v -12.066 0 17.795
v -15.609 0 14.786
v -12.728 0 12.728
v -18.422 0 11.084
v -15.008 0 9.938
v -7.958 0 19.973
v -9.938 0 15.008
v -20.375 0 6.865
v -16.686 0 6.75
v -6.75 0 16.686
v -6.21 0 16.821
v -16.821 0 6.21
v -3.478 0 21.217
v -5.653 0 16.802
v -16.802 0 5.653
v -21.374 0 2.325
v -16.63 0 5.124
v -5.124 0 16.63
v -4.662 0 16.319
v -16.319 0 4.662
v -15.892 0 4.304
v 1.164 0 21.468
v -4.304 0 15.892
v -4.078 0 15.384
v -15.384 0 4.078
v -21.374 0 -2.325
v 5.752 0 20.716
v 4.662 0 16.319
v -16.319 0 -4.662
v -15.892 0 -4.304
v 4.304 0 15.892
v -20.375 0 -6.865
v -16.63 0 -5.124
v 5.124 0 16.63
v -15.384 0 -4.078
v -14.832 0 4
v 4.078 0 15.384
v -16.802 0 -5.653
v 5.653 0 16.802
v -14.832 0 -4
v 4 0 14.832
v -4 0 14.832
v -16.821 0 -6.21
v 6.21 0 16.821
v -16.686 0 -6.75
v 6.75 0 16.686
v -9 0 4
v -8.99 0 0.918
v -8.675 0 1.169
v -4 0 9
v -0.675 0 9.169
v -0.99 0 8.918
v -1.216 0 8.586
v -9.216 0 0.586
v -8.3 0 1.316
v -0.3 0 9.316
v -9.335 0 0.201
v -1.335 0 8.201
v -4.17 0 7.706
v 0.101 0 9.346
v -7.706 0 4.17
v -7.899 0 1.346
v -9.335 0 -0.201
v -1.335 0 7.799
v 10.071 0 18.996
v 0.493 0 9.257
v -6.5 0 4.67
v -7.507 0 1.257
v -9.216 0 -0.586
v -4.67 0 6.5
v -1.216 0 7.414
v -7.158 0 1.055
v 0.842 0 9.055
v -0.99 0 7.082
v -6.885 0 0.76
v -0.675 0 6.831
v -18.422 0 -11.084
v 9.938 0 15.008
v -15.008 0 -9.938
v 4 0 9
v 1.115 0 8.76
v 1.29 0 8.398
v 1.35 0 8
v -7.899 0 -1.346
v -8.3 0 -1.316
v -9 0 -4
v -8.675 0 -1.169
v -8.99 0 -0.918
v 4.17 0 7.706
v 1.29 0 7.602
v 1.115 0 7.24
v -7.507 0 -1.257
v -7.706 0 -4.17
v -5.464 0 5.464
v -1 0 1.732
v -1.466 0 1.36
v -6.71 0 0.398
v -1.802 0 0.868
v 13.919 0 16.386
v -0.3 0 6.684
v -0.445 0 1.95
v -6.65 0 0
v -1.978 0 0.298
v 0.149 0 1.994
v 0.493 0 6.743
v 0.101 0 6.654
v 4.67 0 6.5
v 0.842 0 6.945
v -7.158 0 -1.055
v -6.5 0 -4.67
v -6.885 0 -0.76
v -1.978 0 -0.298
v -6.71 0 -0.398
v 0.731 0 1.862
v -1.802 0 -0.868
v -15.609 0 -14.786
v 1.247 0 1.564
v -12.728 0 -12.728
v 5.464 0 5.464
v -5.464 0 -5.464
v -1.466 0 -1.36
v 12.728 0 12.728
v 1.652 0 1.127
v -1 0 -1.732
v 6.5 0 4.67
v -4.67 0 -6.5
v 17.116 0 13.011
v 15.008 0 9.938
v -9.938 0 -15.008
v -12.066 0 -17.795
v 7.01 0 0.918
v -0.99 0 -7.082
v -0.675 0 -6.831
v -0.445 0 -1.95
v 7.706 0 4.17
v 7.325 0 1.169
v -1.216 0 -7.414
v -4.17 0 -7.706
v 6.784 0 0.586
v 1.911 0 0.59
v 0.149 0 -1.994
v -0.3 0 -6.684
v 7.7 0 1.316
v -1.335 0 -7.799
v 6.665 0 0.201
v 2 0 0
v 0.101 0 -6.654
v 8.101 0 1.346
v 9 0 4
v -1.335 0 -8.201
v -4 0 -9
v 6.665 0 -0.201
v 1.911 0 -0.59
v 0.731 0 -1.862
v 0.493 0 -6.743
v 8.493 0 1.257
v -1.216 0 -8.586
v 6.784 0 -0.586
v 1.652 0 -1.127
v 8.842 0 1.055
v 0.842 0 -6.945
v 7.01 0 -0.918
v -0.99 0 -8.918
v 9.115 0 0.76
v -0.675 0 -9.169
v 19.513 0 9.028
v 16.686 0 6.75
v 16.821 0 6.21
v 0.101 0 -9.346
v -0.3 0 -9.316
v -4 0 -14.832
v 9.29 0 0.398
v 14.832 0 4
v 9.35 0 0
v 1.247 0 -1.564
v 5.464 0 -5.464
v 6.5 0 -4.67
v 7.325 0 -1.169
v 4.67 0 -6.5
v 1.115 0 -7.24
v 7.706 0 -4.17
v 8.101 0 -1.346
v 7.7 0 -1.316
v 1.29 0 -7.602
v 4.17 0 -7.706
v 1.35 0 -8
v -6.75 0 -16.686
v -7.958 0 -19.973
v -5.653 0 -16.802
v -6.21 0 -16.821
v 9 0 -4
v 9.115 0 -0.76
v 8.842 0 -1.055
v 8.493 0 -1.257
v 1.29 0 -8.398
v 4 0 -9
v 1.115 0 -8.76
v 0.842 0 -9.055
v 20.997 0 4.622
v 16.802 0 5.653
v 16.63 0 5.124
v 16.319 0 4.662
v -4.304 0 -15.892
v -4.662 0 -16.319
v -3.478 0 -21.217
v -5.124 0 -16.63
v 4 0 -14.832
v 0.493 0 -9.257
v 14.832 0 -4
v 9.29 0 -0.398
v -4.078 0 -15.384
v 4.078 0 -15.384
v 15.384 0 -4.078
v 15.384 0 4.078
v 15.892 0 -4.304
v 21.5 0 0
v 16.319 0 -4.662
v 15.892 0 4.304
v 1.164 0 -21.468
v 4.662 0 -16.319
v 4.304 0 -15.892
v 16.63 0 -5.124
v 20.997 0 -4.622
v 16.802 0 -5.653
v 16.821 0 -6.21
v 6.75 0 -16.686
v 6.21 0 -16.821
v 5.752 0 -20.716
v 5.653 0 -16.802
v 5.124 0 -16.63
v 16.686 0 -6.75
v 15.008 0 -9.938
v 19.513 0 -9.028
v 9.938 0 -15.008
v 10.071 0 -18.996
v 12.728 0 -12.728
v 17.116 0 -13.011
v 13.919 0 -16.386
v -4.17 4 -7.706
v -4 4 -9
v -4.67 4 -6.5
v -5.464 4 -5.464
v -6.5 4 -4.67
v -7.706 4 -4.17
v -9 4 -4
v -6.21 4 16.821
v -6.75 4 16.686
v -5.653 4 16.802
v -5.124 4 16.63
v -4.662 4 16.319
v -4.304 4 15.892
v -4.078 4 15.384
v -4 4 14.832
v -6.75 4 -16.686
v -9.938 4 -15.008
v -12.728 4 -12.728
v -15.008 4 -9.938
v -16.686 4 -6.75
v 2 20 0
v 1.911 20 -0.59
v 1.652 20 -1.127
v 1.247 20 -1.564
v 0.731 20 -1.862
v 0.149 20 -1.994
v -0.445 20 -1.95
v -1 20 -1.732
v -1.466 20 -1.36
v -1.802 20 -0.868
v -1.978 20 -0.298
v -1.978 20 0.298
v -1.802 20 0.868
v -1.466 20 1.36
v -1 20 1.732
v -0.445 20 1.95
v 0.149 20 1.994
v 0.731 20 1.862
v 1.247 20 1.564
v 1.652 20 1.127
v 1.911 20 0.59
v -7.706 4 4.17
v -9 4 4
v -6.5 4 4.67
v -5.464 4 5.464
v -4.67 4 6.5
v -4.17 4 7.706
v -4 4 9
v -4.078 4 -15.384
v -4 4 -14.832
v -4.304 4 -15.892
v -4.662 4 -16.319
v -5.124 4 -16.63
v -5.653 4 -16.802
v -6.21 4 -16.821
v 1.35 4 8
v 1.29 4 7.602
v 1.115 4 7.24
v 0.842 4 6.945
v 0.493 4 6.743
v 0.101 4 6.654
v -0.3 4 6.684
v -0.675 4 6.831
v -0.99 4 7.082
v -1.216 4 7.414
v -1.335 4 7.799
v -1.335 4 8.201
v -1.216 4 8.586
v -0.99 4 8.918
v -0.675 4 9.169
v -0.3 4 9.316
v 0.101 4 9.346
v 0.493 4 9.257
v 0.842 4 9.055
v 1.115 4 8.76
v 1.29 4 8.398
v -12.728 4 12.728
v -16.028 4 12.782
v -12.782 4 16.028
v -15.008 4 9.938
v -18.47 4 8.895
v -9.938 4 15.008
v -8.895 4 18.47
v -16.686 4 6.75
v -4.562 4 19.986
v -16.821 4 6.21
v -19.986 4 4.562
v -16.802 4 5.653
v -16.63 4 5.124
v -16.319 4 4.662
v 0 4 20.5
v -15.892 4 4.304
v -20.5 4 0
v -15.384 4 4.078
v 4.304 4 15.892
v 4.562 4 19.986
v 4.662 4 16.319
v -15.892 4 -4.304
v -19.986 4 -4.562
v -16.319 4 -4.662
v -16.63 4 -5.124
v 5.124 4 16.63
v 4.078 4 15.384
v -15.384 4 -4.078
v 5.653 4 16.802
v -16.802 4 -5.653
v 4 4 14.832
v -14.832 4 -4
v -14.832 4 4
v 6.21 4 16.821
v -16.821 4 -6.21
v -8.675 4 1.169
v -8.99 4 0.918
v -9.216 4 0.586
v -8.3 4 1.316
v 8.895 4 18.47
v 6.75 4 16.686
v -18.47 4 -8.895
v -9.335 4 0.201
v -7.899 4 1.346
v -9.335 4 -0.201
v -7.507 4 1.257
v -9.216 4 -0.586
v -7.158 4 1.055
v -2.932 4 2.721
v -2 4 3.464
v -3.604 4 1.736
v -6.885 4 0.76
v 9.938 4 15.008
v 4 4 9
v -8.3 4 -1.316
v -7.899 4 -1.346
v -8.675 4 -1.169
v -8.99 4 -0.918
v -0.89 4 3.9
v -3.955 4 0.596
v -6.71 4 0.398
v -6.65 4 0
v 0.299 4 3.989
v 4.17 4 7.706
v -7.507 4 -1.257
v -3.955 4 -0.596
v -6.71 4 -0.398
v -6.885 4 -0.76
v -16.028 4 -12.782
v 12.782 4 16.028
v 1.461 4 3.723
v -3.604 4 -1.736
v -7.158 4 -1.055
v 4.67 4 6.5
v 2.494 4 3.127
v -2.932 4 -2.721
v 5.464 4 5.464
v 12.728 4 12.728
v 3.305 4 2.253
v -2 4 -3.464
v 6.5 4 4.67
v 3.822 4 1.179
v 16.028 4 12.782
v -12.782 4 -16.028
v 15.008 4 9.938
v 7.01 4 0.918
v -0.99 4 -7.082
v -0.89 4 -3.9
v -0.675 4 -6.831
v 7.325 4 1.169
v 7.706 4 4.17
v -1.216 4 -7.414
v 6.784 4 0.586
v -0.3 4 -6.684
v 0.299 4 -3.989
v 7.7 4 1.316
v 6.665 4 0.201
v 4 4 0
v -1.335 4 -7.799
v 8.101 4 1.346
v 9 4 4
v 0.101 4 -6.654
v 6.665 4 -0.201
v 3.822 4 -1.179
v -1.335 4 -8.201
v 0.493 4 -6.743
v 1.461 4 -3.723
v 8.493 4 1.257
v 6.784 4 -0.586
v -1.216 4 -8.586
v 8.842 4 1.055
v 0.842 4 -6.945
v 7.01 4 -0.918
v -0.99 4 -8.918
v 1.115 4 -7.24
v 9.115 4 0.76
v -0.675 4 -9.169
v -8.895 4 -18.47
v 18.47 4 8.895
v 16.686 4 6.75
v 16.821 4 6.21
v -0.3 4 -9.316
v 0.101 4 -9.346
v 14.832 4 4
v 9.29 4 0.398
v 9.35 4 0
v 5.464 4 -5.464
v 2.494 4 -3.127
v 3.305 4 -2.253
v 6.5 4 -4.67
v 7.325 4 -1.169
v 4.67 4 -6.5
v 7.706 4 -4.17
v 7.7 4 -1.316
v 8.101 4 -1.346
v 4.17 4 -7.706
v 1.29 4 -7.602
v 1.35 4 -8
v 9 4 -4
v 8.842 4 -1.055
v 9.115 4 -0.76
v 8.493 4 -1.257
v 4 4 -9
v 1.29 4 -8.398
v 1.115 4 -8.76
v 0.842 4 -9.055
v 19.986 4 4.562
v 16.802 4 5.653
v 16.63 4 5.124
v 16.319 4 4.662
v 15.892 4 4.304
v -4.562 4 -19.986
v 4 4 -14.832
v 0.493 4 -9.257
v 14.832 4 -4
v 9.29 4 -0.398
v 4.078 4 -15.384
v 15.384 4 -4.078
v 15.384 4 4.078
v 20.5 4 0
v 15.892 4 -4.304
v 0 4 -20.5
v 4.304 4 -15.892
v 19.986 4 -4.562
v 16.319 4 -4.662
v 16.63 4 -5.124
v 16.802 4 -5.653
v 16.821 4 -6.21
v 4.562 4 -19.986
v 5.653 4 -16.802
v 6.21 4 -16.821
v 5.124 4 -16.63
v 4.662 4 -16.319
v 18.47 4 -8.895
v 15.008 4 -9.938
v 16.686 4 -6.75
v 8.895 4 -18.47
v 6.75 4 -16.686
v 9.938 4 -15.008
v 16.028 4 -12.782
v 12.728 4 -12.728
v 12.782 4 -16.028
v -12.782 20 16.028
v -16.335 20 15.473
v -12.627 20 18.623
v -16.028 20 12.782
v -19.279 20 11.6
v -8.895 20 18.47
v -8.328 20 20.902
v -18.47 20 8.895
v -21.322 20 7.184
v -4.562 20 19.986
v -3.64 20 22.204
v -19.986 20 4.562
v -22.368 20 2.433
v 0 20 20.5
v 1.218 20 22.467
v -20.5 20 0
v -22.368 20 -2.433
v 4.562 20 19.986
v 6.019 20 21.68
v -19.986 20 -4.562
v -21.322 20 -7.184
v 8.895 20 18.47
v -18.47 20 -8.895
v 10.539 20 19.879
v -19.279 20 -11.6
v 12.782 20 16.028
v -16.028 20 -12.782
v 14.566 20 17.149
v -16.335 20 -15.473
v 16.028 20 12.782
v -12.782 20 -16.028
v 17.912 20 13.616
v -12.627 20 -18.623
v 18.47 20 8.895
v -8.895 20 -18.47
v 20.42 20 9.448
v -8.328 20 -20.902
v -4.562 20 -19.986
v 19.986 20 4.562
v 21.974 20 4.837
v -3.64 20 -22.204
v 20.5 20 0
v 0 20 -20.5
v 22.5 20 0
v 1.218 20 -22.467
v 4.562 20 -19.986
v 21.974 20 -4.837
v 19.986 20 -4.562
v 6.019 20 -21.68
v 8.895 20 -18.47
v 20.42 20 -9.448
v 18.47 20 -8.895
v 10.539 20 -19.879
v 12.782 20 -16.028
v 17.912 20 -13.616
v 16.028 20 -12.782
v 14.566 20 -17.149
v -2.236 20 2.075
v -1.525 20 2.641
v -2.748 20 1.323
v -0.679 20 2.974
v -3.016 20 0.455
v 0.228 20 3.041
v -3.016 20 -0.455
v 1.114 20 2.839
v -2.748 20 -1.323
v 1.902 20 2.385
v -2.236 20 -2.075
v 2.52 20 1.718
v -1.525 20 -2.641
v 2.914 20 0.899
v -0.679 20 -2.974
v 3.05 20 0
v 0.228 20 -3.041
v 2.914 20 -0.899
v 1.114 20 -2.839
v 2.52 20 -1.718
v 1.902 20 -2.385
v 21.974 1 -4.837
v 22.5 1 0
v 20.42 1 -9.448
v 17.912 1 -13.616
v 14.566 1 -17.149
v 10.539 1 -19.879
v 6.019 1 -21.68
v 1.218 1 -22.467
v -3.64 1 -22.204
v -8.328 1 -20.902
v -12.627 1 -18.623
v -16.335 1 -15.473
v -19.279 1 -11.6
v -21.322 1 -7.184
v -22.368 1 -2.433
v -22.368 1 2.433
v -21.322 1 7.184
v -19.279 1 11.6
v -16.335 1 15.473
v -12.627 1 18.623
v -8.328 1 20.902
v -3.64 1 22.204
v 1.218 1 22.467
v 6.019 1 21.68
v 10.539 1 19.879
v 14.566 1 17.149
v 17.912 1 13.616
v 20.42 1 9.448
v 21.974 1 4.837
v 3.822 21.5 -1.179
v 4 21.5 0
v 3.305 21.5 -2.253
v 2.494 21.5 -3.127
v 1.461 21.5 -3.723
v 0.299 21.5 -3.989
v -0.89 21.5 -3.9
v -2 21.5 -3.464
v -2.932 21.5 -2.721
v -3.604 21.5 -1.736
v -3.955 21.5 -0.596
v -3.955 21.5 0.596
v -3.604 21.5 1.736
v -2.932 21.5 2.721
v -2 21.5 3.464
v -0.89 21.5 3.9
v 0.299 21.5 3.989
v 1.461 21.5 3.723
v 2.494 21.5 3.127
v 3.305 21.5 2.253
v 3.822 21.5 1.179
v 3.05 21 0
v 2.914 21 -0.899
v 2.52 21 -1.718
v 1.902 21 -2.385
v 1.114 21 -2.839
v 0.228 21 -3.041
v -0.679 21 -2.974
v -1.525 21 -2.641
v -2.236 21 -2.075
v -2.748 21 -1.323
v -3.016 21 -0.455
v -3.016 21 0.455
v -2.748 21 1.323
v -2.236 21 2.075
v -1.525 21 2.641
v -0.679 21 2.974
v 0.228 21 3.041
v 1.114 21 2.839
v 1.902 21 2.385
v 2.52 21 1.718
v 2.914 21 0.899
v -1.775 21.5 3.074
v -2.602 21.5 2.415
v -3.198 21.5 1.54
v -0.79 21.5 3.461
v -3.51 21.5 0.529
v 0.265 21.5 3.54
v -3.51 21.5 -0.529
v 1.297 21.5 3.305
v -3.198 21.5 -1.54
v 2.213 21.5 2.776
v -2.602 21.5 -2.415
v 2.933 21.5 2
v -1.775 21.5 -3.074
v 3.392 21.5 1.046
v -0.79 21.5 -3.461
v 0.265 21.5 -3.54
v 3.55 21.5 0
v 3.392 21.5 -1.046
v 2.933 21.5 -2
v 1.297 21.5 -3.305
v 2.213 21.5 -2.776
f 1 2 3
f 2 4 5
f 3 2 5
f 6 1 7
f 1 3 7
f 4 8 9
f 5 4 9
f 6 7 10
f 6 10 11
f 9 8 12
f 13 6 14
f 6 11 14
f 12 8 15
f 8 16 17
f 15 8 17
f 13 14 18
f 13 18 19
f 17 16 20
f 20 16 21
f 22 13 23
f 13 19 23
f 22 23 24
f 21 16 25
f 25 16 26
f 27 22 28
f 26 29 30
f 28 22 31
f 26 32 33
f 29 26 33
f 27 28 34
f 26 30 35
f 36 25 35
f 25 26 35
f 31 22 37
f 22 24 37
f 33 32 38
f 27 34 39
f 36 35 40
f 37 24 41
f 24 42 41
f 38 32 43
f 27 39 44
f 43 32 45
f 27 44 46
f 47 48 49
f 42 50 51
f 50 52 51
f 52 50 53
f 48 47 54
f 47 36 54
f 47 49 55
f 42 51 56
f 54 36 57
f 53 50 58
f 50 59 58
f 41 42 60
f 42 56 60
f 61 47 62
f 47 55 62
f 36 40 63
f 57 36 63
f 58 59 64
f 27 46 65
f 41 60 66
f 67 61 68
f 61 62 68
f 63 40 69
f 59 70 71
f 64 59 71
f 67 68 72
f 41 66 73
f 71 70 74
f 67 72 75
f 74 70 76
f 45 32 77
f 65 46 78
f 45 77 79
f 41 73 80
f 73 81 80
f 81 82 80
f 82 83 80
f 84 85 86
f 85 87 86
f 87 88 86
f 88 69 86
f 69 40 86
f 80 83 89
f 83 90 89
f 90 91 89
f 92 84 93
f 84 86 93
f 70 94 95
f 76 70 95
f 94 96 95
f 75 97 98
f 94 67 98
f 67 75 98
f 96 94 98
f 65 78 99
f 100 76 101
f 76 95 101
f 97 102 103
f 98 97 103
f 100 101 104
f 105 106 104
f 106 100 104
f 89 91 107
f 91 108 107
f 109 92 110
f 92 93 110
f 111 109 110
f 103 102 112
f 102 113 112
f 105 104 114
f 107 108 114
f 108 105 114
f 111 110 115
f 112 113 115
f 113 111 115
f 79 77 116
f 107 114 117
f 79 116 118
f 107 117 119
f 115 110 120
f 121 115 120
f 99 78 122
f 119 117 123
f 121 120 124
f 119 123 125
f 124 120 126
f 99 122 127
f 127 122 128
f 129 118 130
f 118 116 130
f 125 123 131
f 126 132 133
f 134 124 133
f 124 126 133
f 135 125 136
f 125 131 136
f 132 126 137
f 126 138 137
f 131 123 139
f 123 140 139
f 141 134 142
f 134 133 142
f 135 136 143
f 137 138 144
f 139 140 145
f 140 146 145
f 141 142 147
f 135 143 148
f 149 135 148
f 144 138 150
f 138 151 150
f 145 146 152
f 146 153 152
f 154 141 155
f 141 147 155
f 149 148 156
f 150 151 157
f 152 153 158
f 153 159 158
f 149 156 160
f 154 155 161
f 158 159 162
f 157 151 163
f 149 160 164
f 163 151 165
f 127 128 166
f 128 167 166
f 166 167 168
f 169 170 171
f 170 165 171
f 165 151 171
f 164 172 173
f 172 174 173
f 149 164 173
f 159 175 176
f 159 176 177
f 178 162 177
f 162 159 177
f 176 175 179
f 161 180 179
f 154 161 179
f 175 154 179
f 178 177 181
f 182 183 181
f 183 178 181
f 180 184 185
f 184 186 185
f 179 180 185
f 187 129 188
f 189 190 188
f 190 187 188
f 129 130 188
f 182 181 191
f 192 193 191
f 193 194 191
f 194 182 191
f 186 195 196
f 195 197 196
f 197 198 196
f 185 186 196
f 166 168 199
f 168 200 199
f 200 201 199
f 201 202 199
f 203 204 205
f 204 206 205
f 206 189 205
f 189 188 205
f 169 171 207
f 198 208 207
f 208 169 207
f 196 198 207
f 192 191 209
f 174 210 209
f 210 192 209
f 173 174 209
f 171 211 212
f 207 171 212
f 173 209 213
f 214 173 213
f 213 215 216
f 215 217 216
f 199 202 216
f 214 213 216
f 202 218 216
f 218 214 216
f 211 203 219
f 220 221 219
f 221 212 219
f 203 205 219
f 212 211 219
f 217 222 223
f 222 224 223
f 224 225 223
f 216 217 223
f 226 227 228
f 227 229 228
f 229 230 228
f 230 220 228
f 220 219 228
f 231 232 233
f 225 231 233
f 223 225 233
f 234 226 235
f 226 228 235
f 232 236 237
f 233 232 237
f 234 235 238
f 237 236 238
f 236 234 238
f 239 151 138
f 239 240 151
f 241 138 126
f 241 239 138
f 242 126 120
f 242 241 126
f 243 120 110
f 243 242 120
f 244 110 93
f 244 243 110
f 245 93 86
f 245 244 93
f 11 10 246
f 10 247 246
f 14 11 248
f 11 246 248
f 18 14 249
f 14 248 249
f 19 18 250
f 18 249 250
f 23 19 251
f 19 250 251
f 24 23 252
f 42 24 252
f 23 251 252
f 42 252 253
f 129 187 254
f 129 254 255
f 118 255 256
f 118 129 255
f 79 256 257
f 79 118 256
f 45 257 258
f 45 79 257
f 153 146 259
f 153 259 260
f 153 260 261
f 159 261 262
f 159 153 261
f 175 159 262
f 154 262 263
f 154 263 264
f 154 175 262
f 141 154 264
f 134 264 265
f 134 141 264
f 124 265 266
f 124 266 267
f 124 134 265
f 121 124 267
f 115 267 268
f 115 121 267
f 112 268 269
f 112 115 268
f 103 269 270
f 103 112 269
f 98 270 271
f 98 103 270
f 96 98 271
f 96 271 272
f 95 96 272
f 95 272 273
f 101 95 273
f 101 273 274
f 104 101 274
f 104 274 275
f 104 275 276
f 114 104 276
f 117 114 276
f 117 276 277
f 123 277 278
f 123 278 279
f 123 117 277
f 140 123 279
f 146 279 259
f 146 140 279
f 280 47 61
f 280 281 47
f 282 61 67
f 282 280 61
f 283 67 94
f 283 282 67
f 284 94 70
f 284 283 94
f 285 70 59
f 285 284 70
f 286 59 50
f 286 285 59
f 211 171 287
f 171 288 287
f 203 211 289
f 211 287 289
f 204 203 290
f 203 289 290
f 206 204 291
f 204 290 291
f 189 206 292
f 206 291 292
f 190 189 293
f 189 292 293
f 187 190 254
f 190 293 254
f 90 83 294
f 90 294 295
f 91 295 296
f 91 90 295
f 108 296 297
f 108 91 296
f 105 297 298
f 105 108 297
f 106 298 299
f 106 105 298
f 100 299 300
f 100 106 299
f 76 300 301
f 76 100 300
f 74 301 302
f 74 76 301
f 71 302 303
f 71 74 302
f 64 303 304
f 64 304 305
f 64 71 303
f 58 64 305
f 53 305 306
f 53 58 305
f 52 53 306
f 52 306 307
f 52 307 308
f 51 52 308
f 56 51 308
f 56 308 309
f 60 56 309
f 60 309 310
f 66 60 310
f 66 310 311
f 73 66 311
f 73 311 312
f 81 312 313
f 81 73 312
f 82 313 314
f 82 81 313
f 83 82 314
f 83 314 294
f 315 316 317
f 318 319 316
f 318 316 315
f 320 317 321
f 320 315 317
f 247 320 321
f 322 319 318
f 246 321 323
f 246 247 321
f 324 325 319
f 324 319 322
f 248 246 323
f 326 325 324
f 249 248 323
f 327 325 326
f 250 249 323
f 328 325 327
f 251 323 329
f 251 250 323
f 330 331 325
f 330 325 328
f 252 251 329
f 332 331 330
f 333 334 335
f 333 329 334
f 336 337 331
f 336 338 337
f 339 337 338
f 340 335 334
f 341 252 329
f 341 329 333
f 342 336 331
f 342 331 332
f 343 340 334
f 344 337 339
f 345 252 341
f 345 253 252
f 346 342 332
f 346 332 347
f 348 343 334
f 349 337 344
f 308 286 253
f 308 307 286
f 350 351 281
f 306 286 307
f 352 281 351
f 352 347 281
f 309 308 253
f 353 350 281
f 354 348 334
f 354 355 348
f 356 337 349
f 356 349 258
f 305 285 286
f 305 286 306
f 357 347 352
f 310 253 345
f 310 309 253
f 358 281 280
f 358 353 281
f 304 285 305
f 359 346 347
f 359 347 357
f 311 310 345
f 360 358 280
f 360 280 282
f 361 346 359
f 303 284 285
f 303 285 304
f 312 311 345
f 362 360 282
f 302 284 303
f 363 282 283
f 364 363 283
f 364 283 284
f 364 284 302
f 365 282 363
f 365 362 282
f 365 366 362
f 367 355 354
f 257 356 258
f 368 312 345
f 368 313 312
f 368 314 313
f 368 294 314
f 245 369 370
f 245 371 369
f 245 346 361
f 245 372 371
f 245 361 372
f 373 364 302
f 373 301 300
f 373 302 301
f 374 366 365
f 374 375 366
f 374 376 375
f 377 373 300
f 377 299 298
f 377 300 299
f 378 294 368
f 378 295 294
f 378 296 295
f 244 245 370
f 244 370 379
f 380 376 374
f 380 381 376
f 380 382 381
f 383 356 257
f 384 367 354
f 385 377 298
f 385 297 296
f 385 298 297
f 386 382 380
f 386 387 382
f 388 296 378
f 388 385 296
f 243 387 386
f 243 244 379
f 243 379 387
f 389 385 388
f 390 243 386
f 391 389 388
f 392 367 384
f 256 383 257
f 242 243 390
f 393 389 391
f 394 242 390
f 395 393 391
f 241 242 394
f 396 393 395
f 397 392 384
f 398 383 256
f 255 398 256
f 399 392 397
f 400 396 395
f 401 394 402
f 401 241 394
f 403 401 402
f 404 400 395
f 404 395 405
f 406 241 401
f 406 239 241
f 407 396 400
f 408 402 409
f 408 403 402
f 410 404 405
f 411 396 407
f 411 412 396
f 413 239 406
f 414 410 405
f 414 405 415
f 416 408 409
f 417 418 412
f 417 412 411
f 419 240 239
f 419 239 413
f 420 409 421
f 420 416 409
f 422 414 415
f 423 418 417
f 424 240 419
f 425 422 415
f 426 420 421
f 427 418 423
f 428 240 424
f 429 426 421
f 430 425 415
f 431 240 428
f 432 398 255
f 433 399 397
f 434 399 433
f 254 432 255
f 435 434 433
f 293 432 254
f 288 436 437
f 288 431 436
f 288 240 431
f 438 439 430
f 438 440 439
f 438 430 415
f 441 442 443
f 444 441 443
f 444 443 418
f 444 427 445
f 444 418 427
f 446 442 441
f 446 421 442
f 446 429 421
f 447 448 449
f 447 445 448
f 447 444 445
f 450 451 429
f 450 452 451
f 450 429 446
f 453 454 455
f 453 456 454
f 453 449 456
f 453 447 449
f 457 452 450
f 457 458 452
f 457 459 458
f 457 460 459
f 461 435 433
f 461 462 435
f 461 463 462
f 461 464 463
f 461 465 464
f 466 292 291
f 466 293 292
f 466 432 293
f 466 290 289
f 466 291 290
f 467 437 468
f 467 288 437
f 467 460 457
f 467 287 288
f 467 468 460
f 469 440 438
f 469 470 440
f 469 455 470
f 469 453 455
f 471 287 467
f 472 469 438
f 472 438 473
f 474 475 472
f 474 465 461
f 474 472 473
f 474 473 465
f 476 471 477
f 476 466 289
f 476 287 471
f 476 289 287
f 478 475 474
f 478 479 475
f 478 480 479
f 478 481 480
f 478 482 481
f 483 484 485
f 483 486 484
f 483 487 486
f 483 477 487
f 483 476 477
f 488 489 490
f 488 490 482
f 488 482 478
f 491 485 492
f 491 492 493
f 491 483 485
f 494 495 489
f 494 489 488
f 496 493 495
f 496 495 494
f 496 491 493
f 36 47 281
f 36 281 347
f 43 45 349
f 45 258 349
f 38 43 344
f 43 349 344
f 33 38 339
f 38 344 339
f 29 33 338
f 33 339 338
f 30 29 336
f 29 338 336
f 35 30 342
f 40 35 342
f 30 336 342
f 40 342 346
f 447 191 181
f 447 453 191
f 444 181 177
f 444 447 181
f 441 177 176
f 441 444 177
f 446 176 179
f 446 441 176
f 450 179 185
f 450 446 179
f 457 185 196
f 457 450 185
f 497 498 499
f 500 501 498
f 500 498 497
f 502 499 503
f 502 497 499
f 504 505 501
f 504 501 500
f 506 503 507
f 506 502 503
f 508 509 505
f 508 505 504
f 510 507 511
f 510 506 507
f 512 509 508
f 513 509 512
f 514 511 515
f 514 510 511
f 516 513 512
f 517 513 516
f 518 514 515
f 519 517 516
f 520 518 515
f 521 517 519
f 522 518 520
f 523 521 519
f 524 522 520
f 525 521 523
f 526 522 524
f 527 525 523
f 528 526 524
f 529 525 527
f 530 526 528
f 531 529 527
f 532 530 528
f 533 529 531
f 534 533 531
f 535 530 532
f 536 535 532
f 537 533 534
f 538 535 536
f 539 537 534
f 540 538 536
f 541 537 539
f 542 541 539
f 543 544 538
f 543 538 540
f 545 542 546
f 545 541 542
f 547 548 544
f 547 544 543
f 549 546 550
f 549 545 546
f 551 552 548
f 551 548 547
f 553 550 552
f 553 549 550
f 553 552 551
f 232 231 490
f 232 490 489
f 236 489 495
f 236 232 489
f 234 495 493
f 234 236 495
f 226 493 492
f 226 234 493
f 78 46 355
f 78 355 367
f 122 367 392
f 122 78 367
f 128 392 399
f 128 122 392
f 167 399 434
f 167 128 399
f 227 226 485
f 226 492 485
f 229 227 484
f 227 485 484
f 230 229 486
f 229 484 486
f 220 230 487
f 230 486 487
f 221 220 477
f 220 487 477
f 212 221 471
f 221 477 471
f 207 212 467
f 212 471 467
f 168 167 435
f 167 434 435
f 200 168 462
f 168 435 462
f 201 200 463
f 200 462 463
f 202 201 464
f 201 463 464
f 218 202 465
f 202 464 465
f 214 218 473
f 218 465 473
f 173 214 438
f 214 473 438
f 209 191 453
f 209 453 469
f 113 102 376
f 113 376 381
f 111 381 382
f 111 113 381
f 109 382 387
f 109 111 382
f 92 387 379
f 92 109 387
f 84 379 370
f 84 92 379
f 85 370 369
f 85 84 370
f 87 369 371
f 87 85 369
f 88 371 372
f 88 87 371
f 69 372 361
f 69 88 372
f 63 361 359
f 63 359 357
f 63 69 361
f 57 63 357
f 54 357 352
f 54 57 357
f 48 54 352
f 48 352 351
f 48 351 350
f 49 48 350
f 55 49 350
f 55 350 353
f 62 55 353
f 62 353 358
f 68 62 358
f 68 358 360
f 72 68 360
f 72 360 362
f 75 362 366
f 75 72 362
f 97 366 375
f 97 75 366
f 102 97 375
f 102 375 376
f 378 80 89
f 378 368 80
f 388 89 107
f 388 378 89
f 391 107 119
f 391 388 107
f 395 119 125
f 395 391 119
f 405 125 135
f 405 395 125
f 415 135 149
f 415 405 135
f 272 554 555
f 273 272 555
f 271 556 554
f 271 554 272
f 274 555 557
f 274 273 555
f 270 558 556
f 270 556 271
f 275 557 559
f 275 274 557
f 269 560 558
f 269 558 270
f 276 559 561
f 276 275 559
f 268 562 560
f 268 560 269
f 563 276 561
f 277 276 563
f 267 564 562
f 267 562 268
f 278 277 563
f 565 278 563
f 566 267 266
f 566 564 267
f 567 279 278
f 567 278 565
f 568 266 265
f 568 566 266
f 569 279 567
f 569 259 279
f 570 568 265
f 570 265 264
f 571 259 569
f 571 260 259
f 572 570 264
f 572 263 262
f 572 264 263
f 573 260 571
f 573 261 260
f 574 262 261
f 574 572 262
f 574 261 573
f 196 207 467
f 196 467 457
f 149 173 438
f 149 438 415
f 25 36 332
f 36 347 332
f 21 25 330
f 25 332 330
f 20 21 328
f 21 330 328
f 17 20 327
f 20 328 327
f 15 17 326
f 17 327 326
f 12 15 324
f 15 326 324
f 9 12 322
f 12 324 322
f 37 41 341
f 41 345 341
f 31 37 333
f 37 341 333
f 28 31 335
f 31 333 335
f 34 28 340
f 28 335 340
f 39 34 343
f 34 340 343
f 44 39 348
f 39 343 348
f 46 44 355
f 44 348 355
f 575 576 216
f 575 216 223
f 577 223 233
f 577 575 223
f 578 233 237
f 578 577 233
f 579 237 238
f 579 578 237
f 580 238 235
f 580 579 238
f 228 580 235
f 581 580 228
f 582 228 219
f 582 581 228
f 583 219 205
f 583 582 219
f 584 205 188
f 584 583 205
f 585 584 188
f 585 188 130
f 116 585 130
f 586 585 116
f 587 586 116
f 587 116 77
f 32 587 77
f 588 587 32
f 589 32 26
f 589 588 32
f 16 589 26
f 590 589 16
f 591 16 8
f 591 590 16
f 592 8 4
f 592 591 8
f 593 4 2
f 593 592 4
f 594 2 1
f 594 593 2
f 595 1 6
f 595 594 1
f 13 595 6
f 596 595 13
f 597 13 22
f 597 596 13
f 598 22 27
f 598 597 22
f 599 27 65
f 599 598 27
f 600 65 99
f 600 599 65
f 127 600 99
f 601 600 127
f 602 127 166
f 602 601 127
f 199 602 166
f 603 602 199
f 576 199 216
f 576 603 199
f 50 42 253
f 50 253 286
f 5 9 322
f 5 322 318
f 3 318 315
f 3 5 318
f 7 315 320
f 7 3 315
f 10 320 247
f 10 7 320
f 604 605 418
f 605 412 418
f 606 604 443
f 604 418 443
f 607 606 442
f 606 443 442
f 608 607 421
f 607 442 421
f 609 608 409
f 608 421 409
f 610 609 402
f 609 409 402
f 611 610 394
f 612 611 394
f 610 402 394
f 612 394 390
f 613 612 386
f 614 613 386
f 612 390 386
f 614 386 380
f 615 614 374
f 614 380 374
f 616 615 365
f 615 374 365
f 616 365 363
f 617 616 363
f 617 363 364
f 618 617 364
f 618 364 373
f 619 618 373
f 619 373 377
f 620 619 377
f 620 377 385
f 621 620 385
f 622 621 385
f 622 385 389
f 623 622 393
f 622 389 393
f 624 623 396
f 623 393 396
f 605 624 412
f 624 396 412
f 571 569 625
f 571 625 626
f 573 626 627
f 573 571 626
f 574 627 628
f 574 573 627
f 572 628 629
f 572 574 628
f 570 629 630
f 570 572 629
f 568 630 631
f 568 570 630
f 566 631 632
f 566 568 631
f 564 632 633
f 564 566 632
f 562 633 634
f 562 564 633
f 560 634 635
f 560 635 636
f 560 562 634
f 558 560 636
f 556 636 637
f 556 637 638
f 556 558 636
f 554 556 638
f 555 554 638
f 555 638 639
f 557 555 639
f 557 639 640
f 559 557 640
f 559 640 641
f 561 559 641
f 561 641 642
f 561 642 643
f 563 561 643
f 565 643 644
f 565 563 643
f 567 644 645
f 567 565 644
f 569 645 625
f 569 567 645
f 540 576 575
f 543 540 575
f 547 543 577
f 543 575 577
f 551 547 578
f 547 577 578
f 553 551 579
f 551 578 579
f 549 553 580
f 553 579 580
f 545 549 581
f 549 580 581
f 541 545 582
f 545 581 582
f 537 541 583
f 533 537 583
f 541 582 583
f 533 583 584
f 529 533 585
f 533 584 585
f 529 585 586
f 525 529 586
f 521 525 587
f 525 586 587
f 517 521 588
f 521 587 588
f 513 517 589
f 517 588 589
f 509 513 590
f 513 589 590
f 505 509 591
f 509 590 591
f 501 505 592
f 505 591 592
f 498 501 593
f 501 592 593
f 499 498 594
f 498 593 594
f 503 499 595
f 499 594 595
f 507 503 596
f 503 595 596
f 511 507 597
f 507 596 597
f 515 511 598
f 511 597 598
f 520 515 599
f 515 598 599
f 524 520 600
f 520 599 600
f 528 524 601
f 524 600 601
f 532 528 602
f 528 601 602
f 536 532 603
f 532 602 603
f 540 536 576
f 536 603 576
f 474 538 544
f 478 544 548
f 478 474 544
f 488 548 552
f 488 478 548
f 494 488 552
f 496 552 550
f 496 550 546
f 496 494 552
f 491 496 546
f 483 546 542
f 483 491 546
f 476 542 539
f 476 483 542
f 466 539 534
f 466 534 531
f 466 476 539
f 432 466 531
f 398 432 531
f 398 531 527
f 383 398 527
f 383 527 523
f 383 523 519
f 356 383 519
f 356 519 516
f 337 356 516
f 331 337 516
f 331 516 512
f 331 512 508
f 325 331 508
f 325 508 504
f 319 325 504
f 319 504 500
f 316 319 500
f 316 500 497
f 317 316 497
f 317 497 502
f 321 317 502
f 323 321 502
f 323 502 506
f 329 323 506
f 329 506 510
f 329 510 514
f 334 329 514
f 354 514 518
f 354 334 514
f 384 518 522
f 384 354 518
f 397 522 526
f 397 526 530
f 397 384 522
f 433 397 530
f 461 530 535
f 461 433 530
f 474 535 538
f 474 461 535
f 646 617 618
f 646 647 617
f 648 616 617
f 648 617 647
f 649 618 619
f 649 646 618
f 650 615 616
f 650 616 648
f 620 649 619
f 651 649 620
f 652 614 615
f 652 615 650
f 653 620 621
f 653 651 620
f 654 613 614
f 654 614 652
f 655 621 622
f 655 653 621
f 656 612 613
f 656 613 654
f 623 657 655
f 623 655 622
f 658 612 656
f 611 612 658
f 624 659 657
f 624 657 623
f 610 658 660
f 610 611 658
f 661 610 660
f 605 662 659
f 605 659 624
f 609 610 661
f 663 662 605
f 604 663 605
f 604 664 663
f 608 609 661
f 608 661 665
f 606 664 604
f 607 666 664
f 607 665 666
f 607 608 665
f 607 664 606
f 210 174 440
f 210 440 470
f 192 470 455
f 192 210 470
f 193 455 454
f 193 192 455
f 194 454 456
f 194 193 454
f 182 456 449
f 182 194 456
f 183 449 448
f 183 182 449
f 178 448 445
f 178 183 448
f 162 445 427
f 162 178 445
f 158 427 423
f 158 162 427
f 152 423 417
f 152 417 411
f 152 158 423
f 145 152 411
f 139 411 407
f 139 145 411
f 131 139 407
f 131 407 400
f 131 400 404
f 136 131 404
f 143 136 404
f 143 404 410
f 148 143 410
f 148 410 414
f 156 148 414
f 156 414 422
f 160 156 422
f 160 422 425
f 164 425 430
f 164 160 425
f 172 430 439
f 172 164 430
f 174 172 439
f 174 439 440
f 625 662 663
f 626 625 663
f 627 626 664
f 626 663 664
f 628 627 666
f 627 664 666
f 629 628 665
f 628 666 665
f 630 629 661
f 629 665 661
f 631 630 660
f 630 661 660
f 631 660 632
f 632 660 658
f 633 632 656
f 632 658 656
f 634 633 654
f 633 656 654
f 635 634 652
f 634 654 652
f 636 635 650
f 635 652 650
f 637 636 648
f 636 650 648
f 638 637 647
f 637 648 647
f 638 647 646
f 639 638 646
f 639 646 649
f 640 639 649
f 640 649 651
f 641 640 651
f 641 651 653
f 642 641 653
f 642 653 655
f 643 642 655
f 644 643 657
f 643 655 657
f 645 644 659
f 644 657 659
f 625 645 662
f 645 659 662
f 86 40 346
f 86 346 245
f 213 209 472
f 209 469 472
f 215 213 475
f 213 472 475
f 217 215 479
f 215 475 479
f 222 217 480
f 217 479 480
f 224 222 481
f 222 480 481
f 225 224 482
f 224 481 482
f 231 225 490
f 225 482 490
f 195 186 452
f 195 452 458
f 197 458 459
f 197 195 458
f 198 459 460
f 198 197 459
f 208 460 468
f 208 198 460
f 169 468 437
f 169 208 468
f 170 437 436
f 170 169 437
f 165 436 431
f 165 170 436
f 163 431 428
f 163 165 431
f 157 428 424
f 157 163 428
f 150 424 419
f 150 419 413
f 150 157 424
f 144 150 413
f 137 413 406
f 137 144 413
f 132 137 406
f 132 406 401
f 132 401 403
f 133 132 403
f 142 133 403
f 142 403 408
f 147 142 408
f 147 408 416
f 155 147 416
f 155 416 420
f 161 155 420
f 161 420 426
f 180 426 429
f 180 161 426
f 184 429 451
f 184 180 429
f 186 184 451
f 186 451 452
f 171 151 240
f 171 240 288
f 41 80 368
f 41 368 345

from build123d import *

# Parameters (mm, degrees)
SKETCH_1_R      = 20.5
SKETCH_1_R_2    = 1.35
SKETCH_1_R_3    = 4
EXTRUDE_1_DEPTH = 4
SKETCH_1_3_R    = 4
SKETCH_1_3_R_2  = 2
EXTRUDE_2_DEPTH = 20
SKETCH_1_4_R    = 22.5
SKETCH_1_4_R_2  = 20.5
EXTRUDE_3_DEPTH = 20
FILLET_1_R      = 5
FILLET_2_R      = 2
CHAMFER_1_SIZE  = 1
SKETCH_2_R      = 4
SKETCH_2_R_2    = 3.05
EXTRUDE_4_DEPTH = 1.5
CHAMFER_2_SIZE  = 0.5


with BuildPart() as part:
    # 草图1 → 凸台-拉伸1 (new body)
    with BuildSketch(Plane(origin=(0, 0, 0), x_dir=(1, 0, 0), z_dir=(0, 1, 0))):
        Circle(SKETCH_1_R)
        with BuildLine():
            Line((-4, -4), (-4, -17.549928775))
            ThreePointArc((-4, -17.549928775), (-12.727922061, -12.727922061), (-17.549928775, -4))
            Line((-17.549928775, -4), (-4, -4))
        make_face(mode=Mode.SUBTRACT)
        with Locations((0, -8)):
            Circle(SKETCH_1_R_2, mode=Mode.SUBTRACT)
        with BuildLine():
            Line((4, -4), (17.549928775, -4))
            ThreePointArc((17.549928775, -4), (12.727922061, -12.727922061), (4, -17.549928775))
            Line((4, -17.549928775), (4, -4))
        make_face(mode=Mode.SUBTRACT)
        with Locations((8, 0)):
            Circle(SKETCH_1_R_2, mode=Mode.SUBTRACT)
        with Locations((-8, 0)):
            Circle(SKETCH_1_R_2, mode=Mode.SUBTRACT)
        with BuildLine():
            Line((-4, 4), (-17.549928775, 4))
            ThreePointArc((-17.549928775, 4), (-12.727922061, 12.727922061), (-4, 17.549928775))
            Line((-4, 17.549928775), (-4, 4))
        make_face(mode=Mode.SUBTRACT)
        Circle(SKETCH_1_R_3, mode=Mode.SUBTRACT)
        with Locations((0, 8)):
            Circle(SKETCH_1_R_2, mode=Mode.SUBTRACT)
        with BuildLine():
            Line((4, 4), (4, 17.549928775))
            ThreePointArc((4, 17.549928775), (12.727922061, 12.727922061), (17.549928775, 4))
            Line((17.549928775, 4), (4, 4))
        make_face(mode=Mode.SUBTRACT)
    extrude(amount=EXTRUDE_1_DEPTH)

    # 草图1<3> → 凸台-拉伸2 (add)
    with BuildSketch(Plane(origin=(0, 0, 0), x_dir=(1, 0, 0), z_dir=(0, 1, 0))):
        Circle(SKETCH_1_3_R)
        Circle(SKETCH_1_3_R_2, mode=Mode.SUBTRACT)
    extrude(amount=EXTRUDE_2_DEPTH)

    # 草图1<4> → 凸台-拉伸3 (add)
    with BuildSketch(Plane(origin=(0, 0, 0), x_dir=(1, 0, 0), z_dir=(0, 1, 0))):
        Circle(SKETCH_1_4_R)
        Circle(SKETCH_1_4_R_2, mode=Mode.SUBTRACT)
    extrude(amount=EXTRUDE_3_DEPTH)

    # 圆角1
    fillet_1_edges = [part.edges().sort_by_distance(p)[0] for p in [
        (-4, 2, 4),
        (4, 2, 4),
        (4, 2, -4),
        (-4, 2, -4),
    ]]
    fillet(fillet_1_edges, radius=FILLET_1_R)

    # 圆角2
    fillet_2_edges = [part.edges().sort_by_distance(p)[0] for p in [
        (4, 2, 17.549928775),
        (17.549928775, 2, 4),
        (17.549928775, 2, -4),
        (4, 2, -17.549928775),
        (-4, 2, 17.549928775),
        (-17.549928775, 2, 4),
        (-4, 2, -17.549928775),
        (-17.549928775, 2, -4),
    ]]
    fillet(fillet_2_edges, radius=FILLET_2_R)

    # 倒角1
    chamfer_1_edges = [part.edges().sort_by_distance(p)[0] for p in [
        (-22.5, 0, 0),
    ]]
    chamfer(chamfer_1_edges, length=CHAMFER_1_SIZE)

    # 草图2 → 凸台-拉伸4 (add)
    with BuildSketch(Plane(origin=(0, 20, 0), x_dir=(1, 0, 0), z_dir=(0, 1, 0))):
        Circle(SKETCH_2_R)
        Circle(SKETCH_2_R_2, mode=Mode.SUBTRACT)
    extrude(amount=EXTRUDE_4_DEPTH)

    # 倒角2
    chamfer_2_edges = [part.edges().sort_by_distance(p)[0] for p in [
        (-3.05, 21.5, 0),
    ]]
    chamfer(chamfer_2_edges, length=CHAMFER_2_SIZE)


solid = part.part
